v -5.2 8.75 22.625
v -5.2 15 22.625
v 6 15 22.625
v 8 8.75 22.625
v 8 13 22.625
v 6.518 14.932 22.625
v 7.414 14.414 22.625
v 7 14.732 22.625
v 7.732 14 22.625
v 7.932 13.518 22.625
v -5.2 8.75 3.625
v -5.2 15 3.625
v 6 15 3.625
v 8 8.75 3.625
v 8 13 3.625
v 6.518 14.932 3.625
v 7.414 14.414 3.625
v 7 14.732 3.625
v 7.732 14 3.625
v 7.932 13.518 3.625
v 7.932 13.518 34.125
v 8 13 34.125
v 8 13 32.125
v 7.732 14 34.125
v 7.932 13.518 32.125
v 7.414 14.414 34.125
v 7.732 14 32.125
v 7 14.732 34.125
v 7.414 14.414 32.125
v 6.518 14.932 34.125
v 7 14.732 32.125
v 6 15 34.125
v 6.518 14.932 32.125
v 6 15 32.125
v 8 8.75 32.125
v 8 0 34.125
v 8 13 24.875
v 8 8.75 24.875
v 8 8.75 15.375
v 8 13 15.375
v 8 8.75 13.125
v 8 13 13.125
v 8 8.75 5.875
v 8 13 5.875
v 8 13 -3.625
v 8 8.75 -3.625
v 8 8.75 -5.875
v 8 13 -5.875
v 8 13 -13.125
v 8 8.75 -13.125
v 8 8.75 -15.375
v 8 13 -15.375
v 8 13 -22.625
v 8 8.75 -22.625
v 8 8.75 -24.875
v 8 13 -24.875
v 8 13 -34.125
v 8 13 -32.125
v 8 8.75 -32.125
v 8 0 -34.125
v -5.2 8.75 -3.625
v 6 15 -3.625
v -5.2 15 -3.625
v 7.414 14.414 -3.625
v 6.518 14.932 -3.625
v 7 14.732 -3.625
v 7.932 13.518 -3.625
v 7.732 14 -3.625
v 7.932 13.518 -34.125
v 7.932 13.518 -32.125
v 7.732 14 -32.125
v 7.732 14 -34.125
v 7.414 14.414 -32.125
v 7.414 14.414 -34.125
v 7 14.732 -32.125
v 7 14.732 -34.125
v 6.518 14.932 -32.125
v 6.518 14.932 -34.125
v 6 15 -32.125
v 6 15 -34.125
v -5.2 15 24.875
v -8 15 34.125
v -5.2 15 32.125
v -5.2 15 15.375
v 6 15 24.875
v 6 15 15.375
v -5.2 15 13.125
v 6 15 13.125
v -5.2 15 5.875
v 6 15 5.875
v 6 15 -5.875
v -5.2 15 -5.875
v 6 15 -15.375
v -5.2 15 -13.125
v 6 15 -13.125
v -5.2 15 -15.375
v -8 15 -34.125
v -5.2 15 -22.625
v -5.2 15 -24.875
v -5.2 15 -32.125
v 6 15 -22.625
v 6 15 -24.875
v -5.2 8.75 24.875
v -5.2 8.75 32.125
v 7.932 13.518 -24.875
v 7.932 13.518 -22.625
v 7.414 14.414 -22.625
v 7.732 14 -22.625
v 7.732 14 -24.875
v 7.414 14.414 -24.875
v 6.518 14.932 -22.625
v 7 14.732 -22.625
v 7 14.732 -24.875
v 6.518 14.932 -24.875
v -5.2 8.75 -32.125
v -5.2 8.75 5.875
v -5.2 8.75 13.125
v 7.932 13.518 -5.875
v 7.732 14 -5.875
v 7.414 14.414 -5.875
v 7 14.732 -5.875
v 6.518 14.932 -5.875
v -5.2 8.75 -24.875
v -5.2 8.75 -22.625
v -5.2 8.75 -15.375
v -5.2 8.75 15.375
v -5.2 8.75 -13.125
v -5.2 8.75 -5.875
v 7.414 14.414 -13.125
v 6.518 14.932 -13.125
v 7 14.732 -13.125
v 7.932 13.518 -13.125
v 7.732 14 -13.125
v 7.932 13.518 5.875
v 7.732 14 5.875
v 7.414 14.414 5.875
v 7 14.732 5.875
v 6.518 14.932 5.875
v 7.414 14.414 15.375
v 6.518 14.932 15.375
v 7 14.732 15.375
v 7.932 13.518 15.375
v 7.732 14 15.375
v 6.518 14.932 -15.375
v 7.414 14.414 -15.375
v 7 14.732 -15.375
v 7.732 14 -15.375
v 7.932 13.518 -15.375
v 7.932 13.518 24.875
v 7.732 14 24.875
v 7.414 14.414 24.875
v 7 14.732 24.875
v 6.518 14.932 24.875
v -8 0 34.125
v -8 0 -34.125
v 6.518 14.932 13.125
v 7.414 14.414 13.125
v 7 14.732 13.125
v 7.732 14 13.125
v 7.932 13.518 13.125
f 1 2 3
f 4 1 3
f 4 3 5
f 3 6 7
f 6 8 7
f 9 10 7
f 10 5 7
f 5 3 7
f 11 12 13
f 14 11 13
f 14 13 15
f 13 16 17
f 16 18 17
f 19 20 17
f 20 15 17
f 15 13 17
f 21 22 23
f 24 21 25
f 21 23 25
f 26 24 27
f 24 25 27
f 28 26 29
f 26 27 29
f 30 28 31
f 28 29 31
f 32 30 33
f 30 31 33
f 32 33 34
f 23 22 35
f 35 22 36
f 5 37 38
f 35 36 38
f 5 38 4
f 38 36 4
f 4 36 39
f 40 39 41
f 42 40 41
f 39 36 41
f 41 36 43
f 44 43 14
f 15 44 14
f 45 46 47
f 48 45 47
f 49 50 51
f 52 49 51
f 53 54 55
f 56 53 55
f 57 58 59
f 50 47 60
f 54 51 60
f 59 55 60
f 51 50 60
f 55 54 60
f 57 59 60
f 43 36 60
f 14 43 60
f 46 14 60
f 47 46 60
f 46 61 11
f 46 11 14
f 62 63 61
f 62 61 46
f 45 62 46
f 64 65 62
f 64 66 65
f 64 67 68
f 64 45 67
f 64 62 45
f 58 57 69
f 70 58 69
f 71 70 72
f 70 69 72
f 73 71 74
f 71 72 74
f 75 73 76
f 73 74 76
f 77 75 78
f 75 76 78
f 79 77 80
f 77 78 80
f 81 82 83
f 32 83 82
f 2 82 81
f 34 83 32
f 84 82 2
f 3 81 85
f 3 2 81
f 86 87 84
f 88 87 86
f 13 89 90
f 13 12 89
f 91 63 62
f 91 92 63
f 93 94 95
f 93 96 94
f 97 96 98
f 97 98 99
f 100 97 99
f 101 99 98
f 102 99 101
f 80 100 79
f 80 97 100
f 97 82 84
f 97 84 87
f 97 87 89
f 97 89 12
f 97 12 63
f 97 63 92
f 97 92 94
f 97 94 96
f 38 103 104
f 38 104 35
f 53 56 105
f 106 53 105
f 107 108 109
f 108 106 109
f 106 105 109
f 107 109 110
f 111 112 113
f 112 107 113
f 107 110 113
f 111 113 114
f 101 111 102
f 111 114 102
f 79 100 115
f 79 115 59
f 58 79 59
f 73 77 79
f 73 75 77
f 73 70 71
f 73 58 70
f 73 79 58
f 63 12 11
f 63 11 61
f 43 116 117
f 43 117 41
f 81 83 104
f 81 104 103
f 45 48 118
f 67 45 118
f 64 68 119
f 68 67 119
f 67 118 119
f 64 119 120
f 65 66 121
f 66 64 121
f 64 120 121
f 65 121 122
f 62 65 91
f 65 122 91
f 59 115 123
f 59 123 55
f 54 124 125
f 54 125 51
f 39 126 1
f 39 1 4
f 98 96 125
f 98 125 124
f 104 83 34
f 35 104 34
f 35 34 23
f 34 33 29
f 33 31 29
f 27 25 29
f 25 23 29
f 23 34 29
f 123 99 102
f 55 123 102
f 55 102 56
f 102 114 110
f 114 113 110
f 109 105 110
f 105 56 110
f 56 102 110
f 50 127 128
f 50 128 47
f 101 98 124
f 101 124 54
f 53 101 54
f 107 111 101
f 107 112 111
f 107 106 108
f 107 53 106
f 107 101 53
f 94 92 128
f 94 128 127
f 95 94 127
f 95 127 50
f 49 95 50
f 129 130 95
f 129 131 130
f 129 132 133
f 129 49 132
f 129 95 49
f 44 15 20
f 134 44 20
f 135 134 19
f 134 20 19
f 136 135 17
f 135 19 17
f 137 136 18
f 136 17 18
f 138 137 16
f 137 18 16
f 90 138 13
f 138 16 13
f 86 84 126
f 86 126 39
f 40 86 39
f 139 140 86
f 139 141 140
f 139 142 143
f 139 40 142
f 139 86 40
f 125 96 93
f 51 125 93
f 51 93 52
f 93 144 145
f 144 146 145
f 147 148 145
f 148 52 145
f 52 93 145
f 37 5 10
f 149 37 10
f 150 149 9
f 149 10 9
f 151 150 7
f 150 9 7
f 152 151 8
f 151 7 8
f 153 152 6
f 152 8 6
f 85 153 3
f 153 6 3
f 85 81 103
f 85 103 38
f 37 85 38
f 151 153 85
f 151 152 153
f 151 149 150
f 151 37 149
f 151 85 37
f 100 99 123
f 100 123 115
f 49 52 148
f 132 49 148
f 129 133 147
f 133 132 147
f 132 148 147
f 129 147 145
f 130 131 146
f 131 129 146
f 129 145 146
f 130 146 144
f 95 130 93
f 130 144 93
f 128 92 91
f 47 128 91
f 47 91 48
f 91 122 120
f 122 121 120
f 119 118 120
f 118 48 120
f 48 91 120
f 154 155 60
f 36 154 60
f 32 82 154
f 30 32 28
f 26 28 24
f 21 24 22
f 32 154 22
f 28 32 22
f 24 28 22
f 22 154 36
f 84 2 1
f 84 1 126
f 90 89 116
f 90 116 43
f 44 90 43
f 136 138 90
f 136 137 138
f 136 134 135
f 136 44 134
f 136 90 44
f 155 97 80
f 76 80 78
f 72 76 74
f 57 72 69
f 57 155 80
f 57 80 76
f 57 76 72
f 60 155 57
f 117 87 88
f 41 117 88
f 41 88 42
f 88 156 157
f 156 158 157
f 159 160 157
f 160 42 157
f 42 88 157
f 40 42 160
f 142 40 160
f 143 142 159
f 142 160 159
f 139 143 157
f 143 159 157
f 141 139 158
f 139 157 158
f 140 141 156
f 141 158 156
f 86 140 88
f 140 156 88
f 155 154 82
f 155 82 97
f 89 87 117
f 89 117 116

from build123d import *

# Parameters (mm, degrees)
SKETCH1_W           = 16
SKETCH1_H           = 68.25
BOSS_EXTRUDE1_DEPTH = 15
FILLET1_R           = 2
SKETCH2_W           = 13.2
SKETCH2_H           = 7.25
CUT_EXTRUDE1_DEPTH  = 6.25
LPATTERN1_COUNT     = 7
LPATTERN1_PITCH     = 9.5


with BuildPart() as part:
    # Sketch1 → Boss-Extrude1 (new body)
    with BuildSketch(Plane(origin=(0, 0, 0), x_dir=(1, 0, 0), z_dir=(0, 1, 0))):
        Rectangle(SKETCH1_W, SKETCH1_H)
    extrude(amount=BOSS_EXTRUDE1_DEPTH)

    # Fillet1
    fillet1_edges = [part.edges().sort_by_distance(p)[0] for p in [
        (8, 15, 0),
    ]]
    fillet(fillet1_edges, radius=FILLET1_R)

    # Sketch2 → Cut-Extrude1 (cut)
    with BuildSketch(Plane(origin=(0, 15, 0), x_dir=(1, 0, 0), z_dir=(0, 1, 0))):
        with Locations((1.4, -28.5)):
            Rectangle(SKETCH2_W, SKETCH2_H)
    cut_extrude1 = extrude(amount=-CUT_EXTRUDE1_DEPTH, mode=Mode.SUBTRACT)

    # LPattern1: Cut-Extrude1 ×7
    with Locations(*[(0, 0, -i * LPATTERN1_PITCH) for i in range(1, LPATTERN1_COUNT)]):
        add(cut_extrude1, mode=Mode.SUBTRACT)


solid = part.part
